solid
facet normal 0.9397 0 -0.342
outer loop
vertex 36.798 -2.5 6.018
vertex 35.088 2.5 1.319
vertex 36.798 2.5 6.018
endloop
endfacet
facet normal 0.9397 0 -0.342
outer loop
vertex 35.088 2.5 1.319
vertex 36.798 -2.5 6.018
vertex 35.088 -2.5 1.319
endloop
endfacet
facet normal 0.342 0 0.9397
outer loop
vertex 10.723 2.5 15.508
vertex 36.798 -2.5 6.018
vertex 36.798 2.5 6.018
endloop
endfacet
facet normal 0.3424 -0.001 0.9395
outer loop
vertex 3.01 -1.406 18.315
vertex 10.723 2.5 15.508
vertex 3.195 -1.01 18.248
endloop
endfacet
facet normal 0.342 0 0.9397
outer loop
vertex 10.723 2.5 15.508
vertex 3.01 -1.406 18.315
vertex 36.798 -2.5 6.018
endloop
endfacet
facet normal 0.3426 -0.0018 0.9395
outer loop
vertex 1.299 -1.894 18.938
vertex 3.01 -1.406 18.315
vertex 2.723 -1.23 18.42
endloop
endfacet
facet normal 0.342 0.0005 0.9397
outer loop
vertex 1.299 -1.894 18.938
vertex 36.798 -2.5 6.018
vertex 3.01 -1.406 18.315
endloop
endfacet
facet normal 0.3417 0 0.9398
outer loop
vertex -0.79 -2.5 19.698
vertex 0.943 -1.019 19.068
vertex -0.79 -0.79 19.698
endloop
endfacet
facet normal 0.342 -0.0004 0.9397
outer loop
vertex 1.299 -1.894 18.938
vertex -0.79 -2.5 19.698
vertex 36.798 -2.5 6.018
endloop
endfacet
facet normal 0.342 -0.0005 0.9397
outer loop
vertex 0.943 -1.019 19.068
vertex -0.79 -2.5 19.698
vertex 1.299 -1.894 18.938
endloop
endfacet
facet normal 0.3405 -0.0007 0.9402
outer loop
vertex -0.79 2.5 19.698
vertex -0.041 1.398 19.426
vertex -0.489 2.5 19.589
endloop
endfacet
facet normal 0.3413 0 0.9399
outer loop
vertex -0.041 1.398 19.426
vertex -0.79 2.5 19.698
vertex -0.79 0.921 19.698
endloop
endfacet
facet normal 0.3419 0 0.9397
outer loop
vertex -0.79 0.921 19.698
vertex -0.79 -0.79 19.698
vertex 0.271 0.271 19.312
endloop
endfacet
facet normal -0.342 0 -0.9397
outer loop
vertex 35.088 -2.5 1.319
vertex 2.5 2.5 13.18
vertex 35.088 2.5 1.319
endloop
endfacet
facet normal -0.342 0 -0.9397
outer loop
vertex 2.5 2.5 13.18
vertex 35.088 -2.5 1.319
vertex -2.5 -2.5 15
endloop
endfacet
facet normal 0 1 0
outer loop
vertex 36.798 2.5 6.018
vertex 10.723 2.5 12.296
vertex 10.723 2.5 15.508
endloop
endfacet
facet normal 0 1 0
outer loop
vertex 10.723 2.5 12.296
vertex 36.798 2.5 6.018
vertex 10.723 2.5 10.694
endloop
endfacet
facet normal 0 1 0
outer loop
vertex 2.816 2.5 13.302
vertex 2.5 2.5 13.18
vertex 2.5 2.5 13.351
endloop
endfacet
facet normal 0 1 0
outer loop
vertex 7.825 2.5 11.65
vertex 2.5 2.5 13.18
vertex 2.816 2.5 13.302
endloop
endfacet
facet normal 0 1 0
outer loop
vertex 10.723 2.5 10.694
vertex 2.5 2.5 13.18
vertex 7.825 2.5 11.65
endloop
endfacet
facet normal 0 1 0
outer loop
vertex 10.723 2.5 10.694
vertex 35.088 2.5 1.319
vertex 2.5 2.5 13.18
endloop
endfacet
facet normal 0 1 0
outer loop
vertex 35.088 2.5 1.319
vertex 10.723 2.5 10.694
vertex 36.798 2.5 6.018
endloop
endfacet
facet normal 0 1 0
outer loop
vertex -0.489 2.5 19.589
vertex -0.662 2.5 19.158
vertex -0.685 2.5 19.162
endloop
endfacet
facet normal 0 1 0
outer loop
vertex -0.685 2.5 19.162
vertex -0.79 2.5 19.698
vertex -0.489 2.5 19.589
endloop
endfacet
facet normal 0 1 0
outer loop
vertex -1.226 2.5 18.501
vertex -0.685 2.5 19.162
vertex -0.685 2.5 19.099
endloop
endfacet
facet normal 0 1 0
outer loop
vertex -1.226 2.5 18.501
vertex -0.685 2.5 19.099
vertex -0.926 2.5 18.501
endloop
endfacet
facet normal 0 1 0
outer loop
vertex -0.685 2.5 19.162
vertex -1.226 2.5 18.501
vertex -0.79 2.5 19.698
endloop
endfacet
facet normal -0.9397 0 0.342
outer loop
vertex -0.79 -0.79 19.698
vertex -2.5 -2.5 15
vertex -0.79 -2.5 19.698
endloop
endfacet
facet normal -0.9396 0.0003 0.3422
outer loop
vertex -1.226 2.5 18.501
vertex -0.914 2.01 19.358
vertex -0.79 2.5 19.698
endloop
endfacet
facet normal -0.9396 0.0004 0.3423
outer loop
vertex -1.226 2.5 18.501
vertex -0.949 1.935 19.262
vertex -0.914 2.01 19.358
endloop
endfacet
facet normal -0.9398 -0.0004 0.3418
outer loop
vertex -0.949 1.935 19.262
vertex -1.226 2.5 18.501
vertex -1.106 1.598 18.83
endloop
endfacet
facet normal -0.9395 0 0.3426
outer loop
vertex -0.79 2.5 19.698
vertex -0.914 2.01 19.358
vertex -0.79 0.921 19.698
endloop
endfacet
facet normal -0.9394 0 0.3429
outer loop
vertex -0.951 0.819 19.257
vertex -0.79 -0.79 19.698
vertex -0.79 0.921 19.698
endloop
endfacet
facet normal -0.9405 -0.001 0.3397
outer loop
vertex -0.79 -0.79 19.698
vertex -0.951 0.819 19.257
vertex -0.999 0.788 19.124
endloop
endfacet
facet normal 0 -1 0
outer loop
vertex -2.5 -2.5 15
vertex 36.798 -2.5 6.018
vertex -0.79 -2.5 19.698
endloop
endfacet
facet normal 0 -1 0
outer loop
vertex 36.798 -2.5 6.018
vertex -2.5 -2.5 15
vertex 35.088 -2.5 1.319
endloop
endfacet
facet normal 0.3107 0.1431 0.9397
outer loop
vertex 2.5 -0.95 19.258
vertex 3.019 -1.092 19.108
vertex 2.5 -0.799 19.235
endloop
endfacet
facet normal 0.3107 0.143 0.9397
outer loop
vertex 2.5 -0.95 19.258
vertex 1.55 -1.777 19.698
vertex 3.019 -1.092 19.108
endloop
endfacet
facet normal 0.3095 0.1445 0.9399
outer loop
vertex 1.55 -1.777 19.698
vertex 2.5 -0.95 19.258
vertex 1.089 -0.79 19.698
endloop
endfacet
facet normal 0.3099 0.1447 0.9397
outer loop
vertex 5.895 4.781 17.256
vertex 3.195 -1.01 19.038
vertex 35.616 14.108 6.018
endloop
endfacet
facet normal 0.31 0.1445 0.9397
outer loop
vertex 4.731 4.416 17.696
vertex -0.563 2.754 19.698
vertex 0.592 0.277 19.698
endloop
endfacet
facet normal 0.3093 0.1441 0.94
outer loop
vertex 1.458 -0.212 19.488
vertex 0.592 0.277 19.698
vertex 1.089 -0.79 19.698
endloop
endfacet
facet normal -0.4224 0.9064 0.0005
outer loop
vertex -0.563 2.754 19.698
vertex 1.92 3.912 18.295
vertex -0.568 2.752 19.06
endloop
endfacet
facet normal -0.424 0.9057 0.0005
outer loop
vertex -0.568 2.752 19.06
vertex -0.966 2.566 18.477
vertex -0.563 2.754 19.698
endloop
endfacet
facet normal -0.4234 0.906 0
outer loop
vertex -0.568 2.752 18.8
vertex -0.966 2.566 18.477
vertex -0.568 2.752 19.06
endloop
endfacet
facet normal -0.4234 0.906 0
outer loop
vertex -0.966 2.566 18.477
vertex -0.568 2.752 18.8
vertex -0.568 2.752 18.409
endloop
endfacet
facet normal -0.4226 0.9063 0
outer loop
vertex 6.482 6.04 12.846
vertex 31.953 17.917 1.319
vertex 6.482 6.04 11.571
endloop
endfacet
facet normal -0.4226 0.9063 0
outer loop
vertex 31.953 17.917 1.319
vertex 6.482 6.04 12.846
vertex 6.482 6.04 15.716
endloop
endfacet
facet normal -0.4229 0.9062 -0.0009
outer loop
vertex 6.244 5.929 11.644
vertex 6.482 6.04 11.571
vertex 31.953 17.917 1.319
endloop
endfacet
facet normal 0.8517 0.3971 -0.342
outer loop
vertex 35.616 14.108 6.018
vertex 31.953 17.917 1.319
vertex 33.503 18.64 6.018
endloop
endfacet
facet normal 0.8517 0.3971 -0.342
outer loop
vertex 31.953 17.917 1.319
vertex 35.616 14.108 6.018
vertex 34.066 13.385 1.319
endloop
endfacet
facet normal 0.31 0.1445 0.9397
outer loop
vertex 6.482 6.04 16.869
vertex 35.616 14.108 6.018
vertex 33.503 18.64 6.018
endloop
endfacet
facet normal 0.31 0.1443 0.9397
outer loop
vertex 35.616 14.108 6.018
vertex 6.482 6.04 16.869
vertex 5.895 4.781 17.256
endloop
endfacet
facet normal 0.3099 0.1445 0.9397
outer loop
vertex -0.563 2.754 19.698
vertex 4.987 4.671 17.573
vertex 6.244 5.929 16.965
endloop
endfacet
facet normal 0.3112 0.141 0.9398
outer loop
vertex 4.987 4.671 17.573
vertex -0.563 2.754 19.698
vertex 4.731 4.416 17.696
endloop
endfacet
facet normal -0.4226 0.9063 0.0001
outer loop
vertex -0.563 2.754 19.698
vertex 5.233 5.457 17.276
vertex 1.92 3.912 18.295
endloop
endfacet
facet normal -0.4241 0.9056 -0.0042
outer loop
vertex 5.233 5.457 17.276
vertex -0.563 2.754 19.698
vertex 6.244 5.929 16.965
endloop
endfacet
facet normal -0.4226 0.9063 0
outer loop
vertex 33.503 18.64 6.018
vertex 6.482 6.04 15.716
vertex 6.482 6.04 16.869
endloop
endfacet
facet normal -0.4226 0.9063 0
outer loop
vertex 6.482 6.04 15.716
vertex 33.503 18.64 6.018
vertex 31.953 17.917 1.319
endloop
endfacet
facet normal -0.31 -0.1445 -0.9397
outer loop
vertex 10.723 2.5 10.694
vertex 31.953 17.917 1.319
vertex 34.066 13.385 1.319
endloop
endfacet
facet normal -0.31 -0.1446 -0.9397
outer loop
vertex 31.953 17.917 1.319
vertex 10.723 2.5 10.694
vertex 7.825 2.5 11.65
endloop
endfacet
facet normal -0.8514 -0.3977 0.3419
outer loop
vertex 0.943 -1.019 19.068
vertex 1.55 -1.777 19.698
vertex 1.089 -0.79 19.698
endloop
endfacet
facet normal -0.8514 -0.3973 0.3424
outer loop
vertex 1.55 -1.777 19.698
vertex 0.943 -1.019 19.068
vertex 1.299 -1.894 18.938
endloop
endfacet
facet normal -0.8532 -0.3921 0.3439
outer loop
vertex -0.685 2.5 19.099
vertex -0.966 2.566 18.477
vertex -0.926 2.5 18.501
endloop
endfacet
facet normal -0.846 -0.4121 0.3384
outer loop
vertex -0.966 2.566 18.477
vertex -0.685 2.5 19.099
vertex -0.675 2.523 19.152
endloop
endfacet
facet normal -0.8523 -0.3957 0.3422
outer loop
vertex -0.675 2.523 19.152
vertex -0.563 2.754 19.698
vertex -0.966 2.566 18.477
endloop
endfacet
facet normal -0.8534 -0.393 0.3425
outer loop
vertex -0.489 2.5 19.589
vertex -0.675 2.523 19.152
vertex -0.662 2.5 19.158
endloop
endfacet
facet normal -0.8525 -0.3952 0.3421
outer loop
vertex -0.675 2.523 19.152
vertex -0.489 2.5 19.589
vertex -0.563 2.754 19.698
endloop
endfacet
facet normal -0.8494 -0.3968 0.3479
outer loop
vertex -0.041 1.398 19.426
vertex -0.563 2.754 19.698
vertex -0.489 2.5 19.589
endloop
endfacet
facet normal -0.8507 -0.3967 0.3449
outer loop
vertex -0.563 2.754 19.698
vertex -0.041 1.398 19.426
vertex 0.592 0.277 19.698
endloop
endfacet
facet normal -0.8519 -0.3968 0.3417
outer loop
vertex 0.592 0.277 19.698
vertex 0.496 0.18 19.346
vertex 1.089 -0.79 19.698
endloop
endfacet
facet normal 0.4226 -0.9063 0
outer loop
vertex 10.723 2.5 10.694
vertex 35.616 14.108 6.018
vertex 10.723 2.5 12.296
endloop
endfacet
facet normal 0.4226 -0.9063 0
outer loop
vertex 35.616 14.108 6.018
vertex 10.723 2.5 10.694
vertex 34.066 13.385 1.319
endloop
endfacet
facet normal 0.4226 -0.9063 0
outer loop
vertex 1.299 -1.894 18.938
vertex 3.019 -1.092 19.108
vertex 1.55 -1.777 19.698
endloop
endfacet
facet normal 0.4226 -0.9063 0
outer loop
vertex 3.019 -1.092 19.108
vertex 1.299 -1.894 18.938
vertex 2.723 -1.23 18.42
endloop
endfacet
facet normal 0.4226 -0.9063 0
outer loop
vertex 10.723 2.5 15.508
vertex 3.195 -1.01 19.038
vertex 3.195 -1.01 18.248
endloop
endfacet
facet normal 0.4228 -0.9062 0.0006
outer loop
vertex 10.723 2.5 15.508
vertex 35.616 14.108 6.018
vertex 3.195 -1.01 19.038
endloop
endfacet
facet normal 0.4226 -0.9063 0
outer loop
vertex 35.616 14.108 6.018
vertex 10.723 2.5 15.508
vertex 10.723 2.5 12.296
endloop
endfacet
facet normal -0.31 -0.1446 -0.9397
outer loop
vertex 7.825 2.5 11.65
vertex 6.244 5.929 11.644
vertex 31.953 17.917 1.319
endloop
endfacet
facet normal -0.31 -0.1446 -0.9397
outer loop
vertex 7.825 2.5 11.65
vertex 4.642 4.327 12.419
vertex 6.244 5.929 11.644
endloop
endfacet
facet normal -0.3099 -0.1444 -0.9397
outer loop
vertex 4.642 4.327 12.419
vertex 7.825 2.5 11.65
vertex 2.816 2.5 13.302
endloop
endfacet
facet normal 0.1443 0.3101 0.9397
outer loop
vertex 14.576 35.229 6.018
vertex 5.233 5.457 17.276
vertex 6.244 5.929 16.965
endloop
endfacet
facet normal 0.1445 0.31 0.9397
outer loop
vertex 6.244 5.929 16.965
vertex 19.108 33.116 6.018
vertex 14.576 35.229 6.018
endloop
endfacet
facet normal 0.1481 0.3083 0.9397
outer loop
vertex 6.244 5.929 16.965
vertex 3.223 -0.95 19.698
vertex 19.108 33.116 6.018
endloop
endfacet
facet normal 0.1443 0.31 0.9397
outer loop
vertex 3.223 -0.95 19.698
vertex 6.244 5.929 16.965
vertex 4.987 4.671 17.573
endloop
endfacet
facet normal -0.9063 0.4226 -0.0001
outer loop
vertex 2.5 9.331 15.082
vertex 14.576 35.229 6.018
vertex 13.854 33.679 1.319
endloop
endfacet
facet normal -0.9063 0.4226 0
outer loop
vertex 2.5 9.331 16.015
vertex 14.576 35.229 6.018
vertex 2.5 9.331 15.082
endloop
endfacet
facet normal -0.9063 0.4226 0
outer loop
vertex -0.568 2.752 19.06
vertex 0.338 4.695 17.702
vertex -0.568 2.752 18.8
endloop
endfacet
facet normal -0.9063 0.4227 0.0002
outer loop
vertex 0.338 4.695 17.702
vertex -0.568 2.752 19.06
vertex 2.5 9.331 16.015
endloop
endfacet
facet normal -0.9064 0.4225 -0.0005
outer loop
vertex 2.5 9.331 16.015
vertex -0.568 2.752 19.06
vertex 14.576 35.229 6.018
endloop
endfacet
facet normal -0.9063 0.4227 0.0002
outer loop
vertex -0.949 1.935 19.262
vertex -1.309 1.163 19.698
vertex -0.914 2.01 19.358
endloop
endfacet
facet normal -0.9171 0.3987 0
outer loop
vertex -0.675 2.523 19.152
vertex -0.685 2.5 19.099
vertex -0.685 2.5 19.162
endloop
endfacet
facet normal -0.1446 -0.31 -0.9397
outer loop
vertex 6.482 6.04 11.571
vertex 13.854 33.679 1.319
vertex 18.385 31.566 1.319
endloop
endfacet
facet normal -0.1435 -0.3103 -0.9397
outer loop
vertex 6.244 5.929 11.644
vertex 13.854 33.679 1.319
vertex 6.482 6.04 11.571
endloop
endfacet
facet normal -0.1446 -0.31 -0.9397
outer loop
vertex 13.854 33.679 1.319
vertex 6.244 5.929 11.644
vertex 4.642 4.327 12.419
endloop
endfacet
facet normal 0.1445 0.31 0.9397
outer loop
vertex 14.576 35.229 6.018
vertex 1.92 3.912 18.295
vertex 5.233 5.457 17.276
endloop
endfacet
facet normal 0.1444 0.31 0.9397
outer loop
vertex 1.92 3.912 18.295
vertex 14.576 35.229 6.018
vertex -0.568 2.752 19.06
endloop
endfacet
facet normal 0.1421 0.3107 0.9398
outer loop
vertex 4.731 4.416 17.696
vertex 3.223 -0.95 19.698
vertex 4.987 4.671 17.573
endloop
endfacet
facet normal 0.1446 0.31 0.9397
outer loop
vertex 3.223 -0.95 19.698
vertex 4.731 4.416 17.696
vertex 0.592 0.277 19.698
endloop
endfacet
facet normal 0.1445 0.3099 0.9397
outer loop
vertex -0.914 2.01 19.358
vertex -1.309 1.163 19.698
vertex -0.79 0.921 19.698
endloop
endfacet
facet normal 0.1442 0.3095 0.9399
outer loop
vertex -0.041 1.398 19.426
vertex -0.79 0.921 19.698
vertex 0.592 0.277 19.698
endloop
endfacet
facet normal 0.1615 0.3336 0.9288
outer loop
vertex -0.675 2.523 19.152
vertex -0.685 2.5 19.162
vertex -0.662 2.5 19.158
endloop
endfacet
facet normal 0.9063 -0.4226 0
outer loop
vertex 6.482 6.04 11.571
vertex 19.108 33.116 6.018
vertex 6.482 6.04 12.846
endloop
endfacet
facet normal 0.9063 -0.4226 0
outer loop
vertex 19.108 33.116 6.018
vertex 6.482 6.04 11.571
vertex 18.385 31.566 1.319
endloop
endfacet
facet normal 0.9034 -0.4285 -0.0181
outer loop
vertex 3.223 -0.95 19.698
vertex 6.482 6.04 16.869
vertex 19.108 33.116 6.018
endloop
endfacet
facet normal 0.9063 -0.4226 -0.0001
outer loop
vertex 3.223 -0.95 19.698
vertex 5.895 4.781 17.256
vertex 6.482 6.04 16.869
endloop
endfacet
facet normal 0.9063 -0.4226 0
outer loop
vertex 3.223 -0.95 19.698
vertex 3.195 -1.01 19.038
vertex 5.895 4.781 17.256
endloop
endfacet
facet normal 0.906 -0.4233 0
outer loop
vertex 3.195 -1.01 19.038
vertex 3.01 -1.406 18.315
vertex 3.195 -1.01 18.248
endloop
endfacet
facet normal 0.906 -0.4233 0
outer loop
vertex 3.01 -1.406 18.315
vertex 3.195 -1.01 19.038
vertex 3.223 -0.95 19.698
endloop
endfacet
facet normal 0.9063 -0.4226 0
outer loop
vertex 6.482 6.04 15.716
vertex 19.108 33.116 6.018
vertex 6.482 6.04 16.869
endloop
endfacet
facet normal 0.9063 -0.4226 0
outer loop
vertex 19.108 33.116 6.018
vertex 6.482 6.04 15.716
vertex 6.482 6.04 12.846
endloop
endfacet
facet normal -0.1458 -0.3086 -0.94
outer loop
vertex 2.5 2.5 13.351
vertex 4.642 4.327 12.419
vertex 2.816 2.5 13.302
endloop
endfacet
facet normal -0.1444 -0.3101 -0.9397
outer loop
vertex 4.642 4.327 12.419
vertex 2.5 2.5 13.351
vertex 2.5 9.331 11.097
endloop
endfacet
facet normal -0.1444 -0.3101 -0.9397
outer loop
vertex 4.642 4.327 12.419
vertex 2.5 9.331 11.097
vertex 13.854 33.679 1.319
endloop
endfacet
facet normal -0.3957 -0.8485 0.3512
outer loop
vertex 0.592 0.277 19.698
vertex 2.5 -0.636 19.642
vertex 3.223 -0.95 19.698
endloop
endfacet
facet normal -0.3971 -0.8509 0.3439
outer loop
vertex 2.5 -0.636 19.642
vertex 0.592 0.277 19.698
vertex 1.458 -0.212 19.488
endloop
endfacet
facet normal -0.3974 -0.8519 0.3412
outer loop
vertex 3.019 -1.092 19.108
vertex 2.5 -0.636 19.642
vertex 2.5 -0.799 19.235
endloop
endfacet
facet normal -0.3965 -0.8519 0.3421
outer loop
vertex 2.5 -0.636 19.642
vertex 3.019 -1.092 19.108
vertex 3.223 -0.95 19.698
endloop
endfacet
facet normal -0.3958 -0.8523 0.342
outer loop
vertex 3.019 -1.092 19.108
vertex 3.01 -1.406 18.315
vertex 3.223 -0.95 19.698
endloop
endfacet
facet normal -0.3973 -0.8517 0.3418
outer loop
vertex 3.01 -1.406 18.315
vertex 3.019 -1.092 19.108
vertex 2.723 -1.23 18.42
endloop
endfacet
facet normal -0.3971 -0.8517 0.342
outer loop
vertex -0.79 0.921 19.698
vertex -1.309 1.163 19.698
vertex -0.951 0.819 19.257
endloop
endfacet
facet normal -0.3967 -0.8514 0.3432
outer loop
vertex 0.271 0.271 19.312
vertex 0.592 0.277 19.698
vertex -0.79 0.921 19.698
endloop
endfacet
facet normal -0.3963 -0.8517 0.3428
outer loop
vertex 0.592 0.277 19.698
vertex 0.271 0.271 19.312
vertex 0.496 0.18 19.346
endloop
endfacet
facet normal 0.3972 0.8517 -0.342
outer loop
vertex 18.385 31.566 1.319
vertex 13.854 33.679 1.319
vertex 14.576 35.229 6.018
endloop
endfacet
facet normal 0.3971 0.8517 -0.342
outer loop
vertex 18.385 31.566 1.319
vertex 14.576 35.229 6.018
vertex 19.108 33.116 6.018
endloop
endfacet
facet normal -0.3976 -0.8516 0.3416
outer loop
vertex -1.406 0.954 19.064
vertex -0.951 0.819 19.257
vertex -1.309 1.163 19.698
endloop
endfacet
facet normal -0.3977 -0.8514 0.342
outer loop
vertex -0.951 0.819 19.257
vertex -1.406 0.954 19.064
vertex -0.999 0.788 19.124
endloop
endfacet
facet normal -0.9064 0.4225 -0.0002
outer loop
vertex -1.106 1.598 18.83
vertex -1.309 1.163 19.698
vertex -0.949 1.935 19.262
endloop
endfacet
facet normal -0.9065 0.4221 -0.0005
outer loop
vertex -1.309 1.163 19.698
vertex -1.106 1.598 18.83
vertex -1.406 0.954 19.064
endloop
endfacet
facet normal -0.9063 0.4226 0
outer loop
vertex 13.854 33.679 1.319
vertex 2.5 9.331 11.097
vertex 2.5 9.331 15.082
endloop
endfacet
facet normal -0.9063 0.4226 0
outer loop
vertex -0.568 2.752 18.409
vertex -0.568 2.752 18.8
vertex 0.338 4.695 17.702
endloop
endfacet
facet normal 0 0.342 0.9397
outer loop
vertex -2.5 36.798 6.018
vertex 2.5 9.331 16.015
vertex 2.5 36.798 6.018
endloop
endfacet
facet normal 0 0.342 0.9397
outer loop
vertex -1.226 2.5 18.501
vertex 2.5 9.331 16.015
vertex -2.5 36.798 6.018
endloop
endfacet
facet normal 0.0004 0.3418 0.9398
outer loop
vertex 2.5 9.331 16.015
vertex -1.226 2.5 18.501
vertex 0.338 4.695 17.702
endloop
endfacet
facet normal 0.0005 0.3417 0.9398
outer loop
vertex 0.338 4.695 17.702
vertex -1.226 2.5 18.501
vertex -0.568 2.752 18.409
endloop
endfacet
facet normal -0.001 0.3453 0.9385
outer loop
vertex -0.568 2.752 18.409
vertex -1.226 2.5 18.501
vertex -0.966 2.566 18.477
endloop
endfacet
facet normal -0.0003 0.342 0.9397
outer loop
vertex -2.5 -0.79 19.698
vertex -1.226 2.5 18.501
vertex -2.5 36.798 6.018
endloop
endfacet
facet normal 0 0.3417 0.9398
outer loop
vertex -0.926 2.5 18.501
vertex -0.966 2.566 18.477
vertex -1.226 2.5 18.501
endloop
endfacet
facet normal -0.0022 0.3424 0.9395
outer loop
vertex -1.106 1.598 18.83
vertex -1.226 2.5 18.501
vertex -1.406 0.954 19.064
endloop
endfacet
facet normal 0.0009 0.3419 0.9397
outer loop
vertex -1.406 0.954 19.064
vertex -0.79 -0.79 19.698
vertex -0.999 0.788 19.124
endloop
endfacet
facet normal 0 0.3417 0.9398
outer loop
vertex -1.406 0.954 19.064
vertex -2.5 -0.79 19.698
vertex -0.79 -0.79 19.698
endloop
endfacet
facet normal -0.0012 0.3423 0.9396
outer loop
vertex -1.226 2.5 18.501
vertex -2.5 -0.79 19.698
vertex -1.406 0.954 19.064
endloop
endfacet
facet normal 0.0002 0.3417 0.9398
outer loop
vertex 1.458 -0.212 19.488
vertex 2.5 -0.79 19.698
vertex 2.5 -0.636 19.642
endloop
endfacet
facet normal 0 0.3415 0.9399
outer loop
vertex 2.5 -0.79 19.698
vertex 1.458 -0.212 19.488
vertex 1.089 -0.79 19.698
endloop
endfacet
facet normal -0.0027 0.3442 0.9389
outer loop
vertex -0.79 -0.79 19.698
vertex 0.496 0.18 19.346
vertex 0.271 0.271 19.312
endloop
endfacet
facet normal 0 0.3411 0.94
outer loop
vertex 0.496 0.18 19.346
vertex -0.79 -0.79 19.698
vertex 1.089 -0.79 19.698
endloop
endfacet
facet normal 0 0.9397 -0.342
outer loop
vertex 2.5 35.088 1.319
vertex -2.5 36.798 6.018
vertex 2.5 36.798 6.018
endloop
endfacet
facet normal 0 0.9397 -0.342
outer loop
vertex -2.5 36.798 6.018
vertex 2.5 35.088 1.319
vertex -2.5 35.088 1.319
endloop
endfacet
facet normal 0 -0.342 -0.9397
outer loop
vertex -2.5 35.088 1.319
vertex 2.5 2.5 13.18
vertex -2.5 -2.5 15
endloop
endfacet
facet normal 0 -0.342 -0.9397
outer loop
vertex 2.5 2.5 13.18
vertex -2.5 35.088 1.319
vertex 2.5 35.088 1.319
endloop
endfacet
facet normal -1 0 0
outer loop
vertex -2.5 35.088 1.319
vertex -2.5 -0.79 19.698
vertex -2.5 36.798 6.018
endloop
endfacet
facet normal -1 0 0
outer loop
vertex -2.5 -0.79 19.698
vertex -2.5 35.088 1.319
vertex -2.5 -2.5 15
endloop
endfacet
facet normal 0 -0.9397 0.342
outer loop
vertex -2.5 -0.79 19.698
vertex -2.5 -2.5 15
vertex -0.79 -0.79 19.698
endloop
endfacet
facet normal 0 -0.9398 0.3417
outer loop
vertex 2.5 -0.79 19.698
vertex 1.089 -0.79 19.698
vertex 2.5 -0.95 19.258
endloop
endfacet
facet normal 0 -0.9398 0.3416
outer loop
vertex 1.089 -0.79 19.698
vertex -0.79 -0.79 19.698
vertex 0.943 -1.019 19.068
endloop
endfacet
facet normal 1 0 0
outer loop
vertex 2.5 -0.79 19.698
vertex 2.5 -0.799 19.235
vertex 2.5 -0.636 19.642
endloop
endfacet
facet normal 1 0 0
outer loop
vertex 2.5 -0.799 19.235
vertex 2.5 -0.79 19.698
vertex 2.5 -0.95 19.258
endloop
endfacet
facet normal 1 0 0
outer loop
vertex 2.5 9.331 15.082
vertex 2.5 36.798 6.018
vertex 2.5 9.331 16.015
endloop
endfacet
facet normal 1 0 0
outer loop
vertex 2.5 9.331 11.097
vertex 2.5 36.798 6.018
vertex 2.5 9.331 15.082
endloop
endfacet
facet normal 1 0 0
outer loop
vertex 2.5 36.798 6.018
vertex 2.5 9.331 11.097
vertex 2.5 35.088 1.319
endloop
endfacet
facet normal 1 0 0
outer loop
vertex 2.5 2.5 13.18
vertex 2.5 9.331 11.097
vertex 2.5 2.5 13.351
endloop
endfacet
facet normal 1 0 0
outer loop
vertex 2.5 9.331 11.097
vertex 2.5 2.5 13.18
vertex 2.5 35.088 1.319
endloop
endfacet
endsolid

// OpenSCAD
union() {
    $fn = 100;

    translate([0, 0, 15]) {
        union() {
            translate([-2.5, -2.5, 0]) rotate([0, 20, 0])  cube(size = [40, 5, 5], center = false);
            translate([0, -2.5, 0]) rotate([0, 20, 25]) cube(size = [40, 5, 5], center = false);
            translate([2.5, -2.5, 0]) rotate([0, 20, 65]) cube(size = [40, 5, 5], center = false);
            translate([2.5, -2.5, 0]) rotate([0, 20, 90]) cube(size = [40, 5, 5], center = false);
        }
    }
}
